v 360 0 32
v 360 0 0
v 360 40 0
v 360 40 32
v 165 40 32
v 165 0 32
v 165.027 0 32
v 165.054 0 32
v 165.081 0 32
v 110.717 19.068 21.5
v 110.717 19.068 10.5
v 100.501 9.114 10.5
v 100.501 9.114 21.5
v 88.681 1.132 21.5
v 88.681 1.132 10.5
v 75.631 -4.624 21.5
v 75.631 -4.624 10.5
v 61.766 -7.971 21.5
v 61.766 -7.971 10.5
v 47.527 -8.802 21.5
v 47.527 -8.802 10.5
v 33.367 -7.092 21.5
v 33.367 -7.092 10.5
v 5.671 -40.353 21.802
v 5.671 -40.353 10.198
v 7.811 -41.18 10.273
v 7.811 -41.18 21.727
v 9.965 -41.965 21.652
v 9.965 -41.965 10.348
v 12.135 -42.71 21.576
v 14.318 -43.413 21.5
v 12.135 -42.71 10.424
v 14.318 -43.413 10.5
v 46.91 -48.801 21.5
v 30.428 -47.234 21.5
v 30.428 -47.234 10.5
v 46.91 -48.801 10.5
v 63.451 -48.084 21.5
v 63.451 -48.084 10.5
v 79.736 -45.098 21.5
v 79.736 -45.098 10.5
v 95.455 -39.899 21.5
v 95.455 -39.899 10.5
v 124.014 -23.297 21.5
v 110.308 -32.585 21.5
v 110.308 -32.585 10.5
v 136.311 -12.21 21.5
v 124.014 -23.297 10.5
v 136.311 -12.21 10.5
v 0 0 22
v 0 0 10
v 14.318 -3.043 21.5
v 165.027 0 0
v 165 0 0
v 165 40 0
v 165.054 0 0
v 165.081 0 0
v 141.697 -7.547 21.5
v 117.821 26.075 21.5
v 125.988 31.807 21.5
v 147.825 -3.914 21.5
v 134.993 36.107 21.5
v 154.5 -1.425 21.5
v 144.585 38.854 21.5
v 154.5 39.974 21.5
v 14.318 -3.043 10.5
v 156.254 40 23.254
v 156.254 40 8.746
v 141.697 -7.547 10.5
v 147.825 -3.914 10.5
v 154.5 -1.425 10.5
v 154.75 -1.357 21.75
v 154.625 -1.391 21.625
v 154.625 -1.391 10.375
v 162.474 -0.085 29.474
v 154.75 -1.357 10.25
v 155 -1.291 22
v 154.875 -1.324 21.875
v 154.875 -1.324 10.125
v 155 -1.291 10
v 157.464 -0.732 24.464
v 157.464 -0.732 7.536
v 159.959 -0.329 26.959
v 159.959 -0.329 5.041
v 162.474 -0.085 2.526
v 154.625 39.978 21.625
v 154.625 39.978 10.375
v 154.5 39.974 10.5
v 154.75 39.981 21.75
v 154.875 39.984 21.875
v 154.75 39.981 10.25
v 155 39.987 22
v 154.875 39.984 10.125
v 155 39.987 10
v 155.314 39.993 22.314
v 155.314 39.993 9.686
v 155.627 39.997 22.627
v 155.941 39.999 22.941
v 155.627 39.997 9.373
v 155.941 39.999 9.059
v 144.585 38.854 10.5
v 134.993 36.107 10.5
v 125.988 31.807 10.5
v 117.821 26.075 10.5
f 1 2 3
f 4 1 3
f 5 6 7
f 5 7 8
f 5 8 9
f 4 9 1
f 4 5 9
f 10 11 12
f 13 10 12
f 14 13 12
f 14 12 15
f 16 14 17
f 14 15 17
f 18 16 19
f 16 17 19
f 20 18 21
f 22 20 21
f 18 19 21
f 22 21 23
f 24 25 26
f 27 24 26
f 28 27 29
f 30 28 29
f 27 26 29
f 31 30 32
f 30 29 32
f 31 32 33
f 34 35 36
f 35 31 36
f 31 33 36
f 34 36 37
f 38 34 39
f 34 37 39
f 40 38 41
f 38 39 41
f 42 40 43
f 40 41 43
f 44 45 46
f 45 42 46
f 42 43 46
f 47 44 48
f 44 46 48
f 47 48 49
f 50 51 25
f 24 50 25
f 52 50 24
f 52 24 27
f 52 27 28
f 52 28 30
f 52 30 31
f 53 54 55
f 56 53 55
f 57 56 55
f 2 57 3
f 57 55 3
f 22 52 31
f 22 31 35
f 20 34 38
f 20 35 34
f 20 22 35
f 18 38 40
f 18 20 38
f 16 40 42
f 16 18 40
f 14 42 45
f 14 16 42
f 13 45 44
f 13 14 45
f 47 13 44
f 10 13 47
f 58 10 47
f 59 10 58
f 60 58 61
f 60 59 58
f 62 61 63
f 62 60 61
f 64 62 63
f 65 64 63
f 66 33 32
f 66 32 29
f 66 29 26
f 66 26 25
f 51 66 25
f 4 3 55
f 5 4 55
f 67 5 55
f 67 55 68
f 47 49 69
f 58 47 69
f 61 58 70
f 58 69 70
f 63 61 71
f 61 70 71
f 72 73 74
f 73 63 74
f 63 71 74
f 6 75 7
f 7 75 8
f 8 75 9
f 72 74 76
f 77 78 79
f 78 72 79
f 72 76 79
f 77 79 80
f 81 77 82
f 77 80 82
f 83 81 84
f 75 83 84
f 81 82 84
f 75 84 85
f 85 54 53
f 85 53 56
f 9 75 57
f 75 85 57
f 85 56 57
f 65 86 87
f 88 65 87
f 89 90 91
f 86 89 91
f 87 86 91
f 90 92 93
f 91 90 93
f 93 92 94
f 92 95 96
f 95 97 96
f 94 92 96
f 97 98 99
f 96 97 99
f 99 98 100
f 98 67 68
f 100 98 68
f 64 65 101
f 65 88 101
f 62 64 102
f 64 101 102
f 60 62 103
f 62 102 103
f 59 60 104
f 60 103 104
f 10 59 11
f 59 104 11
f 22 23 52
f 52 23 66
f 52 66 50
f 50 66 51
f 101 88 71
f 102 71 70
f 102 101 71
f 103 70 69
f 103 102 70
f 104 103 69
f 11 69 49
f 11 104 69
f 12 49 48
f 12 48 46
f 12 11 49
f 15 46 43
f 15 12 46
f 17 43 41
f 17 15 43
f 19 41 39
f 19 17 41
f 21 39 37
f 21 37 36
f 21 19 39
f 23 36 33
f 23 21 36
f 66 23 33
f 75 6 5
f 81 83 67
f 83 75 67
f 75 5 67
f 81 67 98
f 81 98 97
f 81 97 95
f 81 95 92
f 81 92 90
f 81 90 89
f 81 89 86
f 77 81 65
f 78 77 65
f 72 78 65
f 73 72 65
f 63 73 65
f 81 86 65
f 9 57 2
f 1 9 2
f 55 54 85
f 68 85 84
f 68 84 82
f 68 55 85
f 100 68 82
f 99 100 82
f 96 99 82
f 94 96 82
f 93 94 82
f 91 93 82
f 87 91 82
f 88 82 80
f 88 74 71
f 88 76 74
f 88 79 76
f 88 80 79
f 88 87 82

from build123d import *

# Parameters (mm, degrees)
BOSS_EXTRUDE1_DEPTH = 32
CUT_EXTRUDE1_DEPTH  = 373.178248616
CUT_EXTRUDE2_DEPTH  = 373.178248616


with BuildPart() as part:
    # Sketch1 → Boss-Extrude1 (new body)
    with BuildSketch(Plane.XY):
        with BuildLine():
            Line((0, 0), (5.6712054, -40.352723193))
            ThreePointArc((5.6712054, -40.352723193), (75.270905948, -46.149494531), (136.31057695, -12.210145124))
            ThreePointArc((136.31057695, -12.210145124), (149.453776515, -3.178849861), (165.080769267, 0))
            Line((165.080769267, 0), (360, 0))
            Line((360, 0), (360, 40))
            Line((360, 40), (156.254224553, 40))
            ThreePointArc((156.254224553, 40), (131.195287612, 34.51650832), (110.716699745, 19.068322645))
            ThreePointArc((110.716699745, 19.068322645), (75.630846168, -4.623558298), (33.367064735, -7.092388553))
            Line((33.367064735, -7.092388553), (0, 0))
        make_face()
    extrude(amount=BOSS_EXTRUDE1_DEPTH)

    # Sketch3 → Cut-Extrude1 (cut, through all)
    with BuildSketch(Plane(origin=(0, 40, 0), x_dir=(1, 0, 0), z_dir=(0, 1, 0))):
        Polygon((165, 0), (0, 0), (0, -10), (155, -10), align=None)
        Polygon((0, -32), (165, -32), (155, -22), (0, -22), align=None)
    extrude(amount=-CUT_EXTRUDE1_DEPTH, mode=Mode.SUBTRACT)

    # Sketch4 → Cut-Extrude2 (cut, through all)
    with BuildSketch(Plane(origin=(0, 40, 0), x_dir=(1, 0, 0), z_dir=(0, 1, 0))):
        Polygon((155, -10), (0, -10), (14.318126641, -10.5), (154.5, -10.5), align=None)
        Polygon((14.318126641, -21.5), (0, -22), (155, -22), (154.5, -21.5), align=None)
    extrude(amount=-CUT_EXTRUDE2_DEPTH, mode=Mode.SUBTRACT)


solid = part.part
